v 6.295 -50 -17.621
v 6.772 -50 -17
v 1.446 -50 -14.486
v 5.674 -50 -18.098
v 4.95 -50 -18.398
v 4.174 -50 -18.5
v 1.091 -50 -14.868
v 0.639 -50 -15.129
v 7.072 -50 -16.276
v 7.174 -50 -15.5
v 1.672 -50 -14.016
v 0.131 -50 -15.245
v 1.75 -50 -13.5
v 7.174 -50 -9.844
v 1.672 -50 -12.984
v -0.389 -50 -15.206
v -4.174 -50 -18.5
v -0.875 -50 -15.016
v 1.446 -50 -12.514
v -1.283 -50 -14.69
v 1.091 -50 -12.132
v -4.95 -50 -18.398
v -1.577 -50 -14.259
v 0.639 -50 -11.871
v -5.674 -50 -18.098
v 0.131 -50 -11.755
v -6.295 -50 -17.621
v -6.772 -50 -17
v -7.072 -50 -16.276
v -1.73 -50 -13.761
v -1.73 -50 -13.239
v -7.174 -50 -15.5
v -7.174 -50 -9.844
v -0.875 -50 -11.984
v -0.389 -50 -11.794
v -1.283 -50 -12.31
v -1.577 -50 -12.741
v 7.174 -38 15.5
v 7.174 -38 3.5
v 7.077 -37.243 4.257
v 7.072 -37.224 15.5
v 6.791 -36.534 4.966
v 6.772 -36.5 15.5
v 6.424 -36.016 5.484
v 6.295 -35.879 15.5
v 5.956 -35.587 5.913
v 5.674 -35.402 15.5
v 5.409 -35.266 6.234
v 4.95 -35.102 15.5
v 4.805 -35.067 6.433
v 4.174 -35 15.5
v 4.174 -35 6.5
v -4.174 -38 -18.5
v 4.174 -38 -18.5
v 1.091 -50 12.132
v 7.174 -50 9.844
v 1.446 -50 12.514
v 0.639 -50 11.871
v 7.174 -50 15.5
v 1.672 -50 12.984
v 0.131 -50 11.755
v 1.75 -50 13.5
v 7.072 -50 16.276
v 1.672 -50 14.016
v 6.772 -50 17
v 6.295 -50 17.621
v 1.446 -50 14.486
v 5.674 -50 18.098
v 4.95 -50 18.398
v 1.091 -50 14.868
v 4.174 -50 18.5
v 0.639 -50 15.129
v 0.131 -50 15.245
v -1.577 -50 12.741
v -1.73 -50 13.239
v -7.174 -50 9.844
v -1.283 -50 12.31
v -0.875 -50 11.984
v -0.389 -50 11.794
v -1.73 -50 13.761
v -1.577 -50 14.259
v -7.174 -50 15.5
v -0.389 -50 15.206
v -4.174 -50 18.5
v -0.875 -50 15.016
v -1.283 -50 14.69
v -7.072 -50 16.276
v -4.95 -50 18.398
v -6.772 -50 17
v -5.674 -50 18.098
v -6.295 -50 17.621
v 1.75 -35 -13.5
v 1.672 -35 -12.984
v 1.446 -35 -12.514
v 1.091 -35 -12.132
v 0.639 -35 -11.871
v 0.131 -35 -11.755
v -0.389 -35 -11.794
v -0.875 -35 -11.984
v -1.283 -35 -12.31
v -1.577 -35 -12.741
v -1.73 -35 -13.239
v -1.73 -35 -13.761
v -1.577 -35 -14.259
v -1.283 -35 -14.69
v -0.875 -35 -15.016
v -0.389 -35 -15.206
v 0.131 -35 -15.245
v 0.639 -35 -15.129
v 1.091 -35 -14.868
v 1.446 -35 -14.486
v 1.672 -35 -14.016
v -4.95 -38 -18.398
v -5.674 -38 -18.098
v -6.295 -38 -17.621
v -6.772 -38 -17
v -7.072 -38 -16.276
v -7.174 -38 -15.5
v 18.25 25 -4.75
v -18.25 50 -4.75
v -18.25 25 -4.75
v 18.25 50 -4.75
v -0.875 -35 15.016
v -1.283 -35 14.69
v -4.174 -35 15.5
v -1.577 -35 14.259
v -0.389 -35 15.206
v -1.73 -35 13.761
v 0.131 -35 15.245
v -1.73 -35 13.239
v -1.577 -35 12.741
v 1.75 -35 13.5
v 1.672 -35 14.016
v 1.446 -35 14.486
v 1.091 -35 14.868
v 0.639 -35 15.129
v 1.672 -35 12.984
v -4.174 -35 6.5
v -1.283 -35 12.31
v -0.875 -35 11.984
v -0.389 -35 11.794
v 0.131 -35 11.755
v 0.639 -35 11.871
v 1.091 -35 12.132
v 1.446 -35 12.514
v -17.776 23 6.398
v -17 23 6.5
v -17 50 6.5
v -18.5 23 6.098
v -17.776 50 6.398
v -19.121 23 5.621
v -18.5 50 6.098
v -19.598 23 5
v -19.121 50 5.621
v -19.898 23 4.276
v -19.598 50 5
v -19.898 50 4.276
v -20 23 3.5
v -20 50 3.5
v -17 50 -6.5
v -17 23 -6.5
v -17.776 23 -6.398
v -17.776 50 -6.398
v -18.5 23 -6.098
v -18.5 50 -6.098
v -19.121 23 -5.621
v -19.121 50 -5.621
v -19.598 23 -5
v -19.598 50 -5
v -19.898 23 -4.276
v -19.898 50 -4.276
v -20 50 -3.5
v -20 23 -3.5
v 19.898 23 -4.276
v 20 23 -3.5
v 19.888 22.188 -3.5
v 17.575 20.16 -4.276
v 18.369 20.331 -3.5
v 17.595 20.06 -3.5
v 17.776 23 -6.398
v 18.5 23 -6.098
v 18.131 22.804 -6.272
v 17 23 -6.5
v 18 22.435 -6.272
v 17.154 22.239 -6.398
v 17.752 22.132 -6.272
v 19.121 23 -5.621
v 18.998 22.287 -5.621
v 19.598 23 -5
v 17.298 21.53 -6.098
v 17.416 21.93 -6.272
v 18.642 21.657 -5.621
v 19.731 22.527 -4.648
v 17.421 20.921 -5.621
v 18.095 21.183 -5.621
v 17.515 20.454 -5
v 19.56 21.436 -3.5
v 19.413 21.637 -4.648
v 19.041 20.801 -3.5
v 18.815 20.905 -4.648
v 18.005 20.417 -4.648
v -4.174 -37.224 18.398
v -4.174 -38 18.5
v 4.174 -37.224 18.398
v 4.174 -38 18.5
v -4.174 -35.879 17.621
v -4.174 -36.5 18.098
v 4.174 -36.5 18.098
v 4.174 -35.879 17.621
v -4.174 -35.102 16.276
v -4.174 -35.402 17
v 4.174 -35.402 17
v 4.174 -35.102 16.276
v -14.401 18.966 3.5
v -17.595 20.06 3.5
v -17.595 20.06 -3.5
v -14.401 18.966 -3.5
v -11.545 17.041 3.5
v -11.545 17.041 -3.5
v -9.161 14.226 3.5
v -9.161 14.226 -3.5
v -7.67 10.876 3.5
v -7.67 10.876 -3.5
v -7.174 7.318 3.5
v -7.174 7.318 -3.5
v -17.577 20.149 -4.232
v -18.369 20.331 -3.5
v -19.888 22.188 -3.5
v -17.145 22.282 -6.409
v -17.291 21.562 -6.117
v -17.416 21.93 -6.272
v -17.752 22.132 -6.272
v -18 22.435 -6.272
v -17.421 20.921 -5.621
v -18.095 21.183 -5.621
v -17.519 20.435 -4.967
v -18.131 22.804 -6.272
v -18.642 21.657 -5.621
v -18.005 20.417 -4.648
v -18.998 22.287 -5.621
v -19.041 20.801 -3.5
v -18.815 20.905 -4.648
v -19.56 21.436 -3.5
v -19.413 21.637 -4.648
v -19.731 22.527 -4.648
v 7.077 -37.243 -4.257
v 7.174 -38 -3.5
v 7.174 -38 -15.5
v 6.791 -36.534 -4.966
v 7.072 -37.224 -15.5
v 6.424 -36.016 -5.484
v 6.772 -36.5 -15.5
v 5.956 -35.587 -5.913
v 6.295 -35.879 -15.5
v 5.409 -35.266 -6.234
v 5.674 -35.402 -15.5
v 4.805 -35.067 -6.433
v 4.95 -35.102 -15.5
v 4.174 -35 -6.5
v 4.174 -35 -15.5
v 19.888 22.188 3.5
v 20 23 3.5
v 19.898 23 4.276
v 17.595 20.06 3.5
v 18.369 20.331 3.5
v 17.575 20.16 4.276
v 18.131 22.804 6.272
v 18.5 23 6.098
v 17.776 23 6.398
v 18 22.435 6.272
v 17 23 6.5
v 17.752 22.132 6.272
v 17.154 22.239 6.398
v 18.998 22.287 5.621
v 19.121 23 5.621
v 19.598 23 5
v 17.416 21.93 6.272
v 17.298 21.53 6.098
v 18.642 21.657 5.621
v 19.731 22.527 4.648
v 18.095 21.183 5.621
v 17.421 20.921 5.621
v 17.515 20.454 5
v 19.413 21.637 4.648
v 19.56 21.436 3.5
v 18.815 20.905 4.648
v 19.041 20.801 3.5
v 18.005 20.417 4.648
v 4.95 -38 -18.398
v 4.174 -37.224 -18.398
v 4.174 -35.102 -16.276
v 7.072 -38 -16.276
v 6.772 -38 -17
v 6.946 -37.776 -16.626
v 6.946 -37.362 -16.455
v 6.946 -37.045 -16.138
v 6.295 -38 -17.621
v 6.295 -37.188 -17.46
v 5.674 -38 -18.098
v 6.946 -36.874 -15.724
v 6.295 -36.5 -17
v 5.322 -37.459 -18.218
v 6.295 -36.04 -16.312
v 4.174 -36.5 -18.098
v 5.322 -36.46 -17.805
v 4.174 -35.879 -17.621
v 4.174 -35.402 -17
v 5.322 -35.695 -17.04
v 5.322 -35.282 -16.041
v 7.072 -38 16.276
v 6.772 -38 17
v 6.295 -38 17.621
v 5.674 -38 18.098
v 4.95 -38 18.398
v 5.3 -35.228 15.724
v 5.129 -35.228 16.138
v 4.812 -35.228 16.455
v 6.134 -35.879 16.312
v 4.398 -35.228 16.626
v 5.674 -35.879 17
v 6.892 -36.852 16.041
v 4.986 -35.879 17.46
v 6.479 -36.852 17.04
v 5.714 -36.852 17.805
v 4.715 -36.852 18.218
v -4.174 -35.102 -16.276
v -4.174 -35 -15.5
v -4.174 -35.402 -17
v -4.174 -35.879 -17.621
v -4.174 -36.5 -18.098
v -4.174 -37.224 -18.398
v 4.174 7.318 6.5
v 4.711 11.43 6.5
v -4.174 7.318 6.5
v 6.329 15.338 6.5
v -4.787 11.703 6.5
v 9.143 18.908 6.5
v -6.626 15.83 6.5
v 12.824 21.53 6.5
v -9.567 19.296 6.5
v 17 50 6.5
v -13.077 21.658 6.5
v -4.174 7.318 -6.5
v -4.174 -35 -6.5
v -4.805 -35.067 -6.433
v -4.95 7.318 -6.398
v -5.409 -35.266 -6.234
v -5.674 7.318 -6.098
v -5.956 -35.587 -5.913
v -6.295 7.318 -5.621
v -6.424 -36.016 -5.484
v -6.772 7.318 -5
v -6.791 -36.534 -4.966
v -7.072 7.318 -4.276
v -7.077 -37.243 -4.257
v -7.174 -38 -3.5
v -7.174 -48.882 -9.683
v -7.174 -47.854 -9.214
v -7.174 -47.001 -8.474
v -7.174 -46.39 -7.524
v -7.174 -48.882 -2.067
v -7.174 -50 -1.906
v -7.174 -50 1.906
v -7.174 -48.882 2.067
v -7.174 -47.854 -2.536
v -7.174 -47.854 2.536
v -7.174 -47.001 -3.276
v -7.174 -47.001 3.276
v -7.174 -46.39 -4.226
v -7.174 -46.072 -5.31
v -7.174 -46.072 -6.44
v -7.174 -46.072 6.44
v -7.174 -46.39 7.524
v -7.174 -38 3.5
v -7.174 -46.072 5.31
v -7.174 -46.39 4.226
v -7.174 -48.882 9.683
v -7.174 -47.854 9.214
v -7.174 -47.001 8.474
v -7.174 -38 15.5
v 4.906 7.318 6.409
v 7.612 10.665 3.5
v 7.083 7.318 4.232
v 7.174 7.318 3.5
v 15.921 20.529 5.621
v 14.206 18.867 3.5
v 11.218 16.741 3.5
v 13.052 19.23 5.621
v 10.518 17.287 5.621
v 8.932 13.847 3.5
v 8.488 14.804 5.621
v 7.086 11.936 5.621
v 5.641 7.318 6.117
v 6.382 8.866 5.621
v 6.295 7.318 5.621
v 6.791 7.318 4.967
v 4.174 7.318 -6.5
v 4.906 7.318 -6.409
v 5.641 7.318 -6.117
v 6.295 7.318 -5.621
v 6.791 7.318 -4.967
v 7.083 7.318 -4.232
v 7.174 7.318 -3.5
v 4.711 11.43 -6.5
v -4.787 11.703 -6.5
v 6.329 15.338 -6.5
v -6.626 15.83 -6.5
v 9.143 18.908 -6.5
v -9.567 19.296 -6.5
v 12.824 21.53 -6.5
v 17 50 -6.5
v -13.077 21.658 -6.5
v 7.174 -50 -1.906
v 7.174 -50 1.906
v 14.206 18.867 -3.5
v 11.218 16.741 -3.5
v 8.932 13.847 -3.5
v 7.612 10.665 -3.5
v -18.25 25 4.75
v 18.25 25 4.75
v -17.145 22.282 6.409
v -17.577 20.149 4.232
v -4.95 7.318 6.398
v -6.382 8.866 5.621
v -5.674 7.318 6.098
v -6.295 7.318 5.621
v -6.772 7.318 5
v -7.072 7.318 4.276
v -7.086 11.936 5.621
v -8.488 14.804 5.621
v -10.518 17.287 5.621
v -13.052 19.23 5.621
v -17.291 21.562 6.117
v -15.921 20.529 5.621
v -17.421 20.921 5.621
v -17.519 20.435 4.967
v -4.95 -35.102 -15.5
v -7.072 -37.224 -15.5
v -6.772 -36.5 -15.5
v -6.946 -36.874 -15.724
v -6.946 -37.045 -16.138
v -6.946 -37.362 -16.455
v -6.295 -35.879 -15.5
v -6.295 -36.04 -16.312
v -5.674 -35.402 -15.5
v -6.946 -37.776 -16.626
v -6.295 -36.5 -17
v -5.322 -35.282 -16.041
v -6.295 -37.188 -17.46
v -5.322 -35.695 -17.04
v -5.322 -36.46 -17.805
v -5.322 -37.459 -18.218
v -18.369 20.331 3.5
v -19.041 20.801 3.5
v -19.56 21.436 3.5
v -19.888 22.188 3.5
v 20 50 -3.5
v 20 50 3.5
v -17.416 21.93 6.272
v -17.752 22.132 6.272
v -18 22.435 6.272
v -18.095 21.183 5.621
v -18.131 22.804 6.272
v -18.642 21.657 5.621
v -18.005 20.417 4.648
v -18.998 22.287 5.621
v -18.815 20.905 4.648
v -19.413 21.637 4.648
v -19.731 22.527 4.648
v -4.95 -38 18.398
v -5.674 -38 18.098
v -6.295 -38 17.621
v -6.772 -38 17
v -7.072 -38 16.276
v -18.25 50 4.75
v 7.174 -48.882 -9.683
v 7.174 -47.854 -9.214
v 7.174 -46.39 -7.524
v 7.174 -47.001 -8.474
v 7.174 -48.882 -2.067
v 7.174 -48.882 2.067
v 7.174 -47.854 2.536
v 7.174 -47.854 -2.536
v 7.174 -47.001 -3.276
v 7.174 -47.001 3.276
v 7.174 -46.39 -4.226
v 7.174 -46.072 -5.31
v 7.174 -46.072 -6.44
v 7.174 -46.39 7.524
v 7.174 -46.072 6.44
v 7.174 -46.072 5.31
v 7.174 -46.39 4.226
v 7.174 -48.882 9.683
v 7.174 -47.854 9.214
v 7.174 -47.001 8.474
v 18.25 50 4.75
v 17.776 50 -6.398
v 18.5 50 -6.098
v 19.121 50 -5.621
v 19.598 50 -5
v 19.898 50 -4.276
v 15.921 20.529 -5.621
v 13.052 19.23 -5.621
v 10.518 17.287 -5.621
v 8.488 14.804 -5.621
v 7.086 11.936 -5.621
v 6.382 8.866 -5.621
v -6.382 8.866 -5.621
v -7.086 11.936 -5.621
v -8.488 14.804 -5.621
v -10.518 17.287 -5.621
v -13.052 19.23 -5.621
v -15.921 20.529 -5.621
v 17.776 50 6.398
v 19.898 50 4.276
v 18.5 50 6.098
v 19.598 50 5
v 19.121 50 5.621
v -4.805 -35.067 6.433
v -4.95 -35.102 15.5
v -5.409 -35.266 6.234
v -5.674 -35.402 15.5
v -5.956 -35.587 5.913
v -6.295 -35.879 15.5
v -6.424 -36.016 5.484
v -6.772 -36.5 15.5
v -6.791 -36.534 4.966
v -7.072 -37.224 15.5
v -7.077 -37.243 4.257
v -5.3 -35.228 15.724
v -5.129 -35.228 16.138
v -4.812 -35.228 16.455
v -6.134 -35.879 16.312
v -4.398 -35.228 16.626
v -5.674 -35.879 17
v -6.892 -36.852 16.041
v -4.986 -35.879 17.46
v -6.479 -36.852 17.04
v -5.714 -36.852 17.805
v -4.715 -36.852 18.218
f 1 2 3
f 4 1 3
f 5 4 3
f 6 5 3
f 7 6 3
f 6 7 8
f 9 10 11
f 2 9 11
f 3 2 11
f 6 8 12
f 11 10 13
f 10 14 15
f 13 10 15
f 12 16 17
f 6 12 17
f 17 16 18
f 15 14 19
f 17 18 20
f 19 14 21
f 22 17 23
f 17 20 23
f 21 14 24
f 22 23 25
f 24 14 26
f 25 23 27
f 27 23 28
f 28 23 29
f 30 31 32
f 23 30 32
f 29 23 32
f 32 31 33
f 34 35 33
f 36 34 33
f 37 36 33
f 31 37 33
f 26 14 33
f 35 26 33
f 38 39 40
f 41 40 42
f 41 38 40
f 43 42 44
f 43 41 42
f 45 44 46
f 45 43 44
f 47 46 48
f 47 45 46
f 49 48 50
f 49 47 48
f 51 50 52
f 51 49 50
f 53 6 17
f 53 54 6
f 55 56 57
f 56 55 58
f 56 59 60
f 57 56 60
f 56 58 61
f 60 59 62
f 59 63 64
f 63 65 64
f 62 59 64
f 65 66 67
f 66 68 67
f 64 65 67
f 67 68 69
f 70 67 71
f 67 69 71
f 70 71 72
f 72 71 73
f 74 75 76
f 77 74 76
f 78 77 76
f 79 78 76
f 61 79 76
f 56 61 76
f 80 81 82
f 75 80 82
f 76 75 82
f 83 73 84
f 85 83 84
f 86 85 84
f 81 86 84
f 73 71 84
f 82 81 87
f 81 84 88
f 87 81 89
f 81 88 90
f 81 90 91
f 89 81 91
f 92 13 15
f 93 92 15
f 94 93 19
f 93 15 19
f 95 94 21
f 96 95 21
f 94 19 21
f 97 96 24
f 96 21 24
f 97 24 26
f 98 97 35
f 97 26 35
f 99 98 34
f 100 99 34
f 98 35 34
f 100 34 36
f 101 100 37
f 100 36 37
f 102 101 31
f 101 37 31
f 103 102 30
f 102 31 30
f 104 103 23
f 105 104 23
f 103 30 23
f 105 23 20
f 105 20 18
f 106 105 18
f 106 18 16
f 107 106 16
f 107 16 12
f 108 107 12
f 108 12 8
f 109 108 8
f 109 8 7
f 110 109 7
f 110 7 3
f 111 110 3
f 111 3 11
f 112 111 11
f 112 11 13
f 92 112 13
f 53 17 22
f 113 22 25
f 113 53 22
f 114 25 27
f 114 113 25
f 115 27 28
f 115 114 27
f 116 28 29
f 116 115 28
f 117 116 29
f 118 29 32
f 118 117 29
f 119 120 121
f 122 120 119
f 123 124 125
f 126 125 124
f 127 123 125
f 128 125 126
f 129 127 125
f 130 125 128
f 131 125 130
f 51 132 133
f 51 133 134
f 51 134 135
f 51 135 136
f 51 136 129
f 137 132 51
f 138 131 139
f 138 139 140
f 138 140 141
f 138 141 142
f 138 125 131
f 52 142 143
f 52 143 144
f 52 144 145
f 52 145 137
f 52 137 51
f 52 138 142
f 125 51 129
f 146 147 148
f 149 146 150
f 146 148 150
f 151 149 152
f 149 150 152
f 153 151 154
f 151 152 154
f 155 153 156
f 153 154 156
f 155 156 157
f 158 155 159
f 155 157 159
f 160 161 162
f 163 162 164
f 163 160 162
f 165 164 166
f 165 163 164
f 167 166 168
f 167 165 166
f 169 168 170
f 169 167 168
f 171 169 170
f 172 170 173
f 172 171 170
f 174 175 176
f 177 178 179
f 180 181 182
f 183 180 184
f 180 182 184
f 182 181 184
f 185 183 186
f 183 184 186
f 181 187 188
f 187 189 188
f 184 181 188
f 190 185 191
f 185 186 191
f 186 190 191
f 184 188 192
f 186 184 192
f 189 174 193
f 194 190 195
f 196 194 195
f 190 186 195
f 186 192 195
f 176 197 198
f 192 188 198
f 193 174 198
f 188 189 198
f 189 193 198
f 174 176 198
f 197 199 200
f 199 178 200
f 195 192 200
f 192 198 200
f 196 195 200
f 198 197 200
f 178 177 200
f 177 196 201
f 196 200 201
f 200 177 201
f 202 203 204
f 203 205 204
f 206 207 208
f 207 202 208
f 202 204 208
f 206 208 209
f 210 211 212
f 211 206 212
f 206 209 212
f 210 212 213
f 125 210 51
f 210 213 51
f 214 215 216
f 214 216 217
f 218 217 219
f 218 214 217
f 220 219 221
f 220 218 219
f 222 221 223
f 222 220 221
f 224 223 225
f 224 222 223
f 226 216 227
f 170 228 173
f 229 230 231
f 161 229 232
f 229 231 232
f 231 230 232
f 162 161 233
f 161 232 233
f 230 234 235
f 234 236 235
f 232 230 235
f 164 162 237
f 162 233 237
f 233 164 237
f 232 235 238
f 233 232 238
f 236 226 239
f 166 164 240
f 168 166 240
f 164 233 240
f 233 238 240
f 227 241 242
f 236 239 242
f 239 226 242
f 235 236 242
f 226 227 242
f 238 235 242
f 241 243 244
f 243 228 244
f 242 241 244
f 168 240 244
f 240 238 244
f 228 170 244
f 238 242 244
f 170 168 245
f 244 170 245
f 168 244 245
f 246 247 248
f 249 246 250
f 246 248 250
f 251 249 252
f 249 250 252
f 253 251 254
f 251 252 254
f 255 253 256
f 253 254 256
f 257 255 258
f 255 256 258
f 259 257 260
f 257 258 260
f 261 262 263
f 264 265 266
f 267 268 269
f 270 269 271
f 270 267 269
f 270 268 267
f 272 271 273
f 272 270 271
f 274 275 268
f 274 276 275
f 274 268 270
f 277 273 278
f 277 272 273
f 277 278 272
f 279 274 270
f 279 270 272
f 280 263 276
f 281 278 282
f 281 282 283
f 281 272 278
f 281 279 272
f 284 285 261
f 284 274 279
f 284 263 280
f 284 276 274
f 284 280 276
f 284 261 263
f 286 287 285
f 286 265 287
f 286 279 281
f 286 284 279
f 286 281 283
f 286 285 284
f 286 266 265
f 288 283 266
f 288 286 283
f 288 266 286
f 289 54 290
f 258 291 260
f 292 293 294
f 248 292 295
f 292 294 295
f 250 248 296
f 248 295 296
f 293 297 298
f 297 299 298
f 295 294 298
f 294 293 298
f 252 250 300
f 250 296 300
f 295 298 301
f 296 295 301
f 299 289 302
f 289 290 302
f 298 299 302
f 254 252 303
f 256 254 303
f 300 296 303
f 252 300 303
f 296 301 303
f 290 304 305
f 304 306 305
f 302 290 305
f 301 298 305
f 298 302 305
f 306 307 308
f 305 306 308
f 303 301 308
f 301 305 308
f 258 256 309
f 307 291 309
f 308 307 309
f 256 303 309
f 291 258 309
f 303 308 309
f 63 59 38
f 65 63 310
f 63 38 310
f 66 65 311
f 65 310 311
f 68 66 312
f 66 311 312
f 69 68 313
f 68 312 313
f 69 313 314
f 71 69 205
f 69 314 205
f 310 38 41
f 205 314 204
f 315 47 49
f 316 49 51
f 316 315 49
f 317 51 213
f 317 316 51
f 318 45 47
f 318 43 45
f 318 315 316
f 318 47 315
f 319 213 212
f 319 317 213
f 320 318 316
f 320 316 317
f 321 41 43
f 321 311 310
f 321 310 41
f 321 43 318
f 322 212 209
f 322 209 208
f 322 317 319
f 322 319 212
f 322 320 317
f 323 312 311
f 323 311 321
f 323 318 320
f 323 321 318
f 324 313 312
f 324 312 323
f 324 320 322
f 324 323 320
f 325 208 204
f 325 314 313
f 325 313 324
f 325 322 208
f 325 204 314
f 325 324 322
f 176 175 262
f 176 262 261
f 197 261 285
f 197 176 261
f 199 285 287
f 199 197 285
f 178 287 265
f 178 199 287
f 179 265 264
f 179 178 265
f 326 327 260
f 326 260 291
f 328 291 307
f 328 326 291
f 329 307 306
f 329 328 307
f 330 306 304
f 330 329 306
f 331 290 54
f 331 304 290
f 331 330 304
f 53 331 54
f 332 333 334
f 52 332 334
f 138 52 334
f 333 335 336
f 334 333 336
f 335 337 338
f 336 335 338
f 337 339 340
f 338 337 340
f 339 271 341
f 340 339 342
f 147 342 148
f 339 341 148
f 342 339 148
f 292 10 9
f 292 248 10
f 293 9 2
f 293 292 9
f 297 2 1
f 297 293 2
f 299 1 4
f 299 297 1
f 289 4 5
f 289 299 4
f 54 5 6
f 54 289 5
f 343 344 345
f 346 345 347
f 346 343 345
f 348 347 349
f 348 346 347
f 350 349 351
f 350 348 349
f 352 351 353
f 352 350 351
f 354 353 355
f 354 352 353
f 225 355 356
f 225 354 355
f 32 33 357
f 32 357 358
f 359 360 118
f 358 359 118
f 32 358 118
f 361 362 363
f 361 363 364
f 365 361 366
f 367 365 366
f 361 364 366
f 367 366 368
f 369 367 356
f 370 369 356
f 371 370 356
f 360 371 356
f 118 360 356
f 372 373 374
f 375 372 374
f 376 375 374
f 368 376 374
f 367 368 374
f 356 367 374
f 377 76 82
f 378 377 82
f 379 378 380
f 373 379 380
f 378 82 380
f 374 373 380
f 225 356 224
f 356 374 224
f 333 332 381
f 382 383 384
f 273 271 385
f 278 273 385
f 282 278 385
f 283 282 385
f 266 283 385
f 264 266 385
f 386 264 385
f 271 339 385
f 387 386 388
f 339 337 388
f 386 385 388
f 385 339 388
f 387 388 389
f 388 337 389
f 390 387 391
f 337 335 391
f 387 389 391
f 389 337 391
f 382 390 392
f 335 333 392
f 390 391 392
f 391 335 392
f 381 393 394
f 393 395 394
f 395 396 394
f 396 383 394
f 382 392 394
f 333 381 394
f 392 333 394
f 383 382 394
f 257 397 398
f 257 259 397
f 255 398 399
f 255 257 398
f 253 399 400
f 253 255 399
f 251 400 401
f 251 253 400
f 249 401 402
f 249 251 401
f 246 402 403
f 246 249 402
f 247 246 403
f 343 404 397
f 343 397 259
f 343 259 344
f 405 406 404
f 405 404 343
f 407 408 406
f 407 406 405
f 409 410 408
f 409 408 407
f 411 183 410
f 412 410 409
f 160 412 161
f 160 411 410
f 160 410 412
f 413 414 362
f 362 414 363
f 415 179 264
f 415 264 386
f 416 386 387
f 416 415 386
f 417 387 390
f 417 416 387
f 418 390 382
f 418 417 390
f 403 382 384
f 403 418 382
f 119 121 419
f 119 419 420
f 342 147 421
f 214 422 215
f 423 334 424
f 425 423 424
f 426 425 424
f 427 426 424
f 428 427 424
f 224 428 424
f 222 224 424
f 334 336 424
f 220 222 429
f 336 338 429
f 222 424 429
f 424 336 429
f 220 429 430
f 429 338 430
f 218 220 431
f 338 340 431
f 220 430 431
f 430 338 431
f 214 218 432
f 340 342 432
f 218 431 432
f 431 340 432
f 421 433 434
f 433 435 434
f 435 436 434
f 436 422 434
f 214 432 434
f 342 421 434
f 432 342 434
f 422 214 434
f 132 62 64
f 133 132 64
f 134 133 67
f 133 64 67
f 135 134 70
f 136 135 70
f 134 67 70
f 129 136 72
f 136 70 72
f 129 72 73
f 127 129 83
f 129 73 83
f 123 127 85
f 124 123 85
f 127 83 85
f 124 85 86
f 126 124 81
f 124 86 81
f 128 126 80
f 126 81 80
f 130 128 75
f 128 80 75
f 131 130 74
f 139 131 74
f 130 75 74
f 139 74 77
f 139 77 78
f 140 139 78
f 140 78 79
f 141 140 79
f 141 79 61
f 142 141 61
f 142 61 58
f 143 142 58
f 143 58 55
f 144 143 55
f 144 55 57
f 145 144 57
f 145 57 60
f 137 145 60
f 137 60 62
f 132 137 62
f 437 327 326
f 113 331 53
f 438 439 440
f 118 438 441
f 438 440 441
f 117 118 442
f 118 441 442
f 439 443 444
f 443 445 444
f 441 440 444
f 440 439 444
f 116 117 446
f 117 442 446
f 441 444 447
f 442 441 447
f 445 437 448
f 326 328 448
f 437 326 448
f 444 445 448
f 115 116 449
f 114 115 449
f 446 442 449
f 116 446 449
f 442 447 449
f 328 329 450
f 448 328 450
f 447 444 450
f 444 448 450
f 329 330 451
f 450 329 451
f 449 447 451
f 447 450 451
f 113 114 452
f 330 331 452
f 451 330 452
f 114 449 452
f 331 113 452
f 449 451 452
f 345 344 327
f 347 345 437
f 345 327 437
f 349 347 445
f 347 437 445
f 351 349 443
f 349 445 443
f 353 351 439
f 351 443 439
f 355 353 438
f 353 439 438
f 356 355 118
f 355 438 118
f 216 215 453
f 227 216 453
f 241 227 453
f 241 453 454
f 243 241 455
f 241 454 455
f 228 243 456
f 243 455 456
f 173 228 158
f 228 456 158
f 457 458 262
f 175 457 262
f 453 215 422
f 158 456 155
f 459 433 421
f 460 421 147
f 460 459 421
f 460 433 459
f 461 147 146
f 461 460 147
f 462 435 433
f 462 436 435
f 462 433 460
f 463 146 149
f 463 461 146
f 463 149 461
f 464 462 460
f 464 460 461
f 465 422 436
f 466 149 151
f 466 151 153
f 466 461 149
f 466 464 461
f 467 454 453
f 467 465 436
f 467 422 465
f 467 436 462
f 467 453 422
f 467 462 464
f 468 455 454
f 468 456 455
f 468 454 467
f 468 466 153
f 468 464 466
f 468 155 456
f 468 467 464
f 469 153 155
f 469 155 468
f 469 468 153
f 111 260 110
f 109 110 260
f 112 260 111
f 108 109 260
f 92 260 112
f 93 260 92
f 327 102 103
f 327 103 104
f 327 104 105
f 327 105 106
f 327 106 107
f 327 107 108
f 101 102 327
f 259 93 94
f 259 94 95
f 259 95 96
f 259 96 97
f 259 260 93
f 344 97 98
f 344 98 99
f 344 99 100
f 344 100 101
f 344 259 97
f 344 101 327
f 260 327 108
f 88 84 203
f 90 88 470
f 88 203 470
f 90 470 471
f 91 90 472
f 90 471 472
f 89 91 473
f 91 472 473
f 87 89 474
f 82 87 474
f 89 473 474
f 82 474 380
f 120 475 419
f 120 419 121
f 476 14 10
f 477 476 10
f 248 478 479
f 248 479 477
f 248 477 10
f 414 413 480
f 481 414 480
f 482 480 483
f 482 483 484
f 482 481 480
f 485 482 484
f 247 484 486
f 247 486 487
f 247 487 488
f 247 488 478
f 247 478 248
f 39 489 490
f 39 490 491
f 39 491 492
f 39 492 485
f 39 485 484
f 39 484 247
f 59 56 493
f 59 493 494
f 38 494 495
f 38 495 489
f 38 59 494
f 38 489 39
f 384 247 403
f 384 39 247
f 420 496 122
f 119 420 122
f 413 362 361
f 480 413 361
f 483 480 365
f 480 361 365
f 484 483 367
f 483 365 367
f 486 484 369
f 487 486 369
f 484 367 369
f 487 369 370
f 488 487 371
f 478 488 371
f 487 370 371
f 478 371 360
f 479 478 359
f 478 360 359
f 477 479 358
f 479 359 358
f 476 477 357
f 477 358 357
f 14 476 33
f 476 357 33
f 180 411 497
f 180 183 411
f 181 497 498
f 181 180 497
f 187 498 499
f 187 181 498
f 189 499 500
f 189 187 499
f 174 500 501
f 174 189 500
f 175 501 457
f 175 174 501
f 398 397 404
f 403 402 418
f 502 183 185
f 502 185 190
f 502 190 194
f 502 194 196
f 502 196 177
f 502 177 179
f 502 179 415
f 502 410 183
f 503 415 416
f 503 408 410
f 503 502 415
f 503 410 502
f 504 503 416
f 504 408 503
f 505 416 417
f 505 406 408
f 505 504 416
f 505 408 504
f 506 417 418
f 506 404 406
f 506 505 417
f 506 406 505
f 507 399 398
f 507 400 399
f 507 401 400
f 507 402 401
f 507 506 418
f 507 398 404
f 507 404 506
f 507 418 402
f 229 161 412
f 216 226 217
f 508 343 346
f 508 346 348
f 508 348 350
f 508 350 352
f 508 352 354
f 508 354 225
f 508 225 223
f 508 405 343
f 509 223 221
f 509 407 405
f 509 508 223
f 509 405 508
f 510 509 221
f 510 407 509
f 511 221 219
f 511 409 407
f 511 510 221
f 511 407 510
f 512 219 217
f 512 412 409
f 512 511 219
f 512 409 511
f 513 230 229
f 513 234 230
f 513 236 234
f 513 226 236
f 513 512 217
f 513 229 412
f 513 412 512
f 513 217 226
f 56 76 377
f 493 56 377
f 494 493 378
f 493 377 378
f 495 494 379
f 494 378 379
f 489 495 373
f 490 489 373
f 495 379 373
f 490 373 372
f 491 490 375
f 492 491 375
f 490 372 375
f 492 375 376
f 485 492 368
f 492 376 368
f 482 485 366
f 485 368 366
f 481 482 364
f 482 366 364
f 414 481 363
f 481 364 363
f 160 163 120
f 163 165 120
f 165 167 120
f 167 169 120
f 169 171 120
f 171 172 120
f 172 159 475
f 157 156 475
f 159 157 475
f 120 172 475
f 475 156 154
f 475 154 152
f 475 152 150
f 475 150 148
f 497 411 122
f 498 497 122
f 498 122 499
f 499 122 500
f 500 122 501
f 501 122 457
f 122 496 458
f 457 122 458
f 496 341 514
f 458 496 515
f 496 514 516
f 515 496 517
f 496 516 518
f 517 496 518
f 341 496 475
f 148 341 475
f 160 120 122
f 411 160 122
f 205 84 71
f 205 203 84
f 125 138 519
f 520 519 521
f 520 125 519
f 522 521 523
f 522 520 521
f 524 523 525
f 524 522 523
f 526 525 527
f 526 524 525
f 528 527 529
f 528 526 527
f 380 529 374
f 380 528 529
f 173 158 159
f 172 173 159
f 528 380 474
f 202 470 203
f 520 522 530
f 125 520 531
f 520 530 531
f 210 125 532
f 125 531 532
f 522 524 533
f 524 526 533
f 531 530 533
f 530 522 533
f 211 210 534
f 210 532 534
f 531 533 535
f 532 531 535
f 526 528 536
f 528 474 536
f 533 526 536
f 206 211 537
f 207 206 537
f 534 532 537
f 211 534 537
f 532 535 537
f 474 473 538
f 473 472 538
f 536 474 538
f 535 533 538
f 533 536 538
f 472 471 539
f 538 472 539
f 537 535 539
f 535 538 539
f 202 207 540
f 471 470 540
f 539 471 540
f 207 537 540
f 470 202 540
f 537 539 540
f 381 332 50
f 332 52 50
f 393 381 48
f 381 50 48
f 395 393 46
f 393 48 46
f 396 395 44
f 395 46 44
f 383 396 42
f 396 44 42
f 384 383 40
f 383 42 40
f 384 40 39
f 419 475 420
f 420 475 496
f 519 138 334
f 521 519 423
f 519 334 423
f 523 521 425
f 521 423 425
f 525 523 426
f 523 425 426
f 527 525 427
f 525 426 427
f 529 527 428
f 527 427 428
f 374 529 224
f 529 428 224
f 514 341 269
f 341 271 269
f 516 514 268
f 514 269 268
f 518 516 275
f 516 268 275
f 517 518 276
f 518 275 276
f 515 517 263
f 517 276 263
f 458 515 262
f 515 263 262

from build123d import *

# Parameters (mm, degrees)
RESSALTO_EXTRUS_O1_DEPTH = 6.5
FILETE1_R                = 3
FILETE2_R                = 3
FILETE3_R                = 13
ESBO_O4_W                = 36.5
ESBO_O4_H                = 9.5
CORTE_EXTRUS_O1_DEPTH    = 25
ESBO_O11_W               = 14.347963754
ESBO_O11_H               = 15
RESSALTO_EXTRUS_O5_DEPTH = 12
ESBO_O17_W               = 14.347963754
ESBO_O17_H               = 15
RESSALTO_EXTRUS_O6_DEPTH = 12
ESBO_O18_R               = 1.75
CORTE_EXTRUS_O5_DEPTH    = 25
ESBO_O19_R               = 3.96875
CORTE_EXTRUS_O6_DEPTH    = 25
FILETE14_R               = 3


with BuildPart() as part:
    # Esboço2 → Ressalto-extrusão1 (new body, symmetric)
    with BuildSketch(Plane.XY):
        Polygon((-20, 50), (20, 50), (20, 20), (7.173981877, 20), (7.173981877, -50), (-7.173981877, -50), (-7.173981877, 20), (-20, 20), align=None)
    extrude(amount=RESSALTO_EXTRUS_O1_DEPTH, both=True)

    # Filete1
    filete1_edges = [part.edges().sort_by_distance(p)[0] for p in [
        (-20, 20, 0),
    ]]
    fillet(filete1_edges, radius=FILETE1_R)

    # Filete2
    filete2_edges = [part.edges().sort_by_distance(p)[0] for p in [
        (20, 20, 0),
    ]]
    fillet(filete2_edges, radius=FILETE2_R)

    # Filete3
    filete3_edges = [part.edges().sort_by_distance(p)[0] for p in [
        (-7.173981877, 20, 0),
        (7.173981877, 20, 0),
    ]]
    fillet(filete3_edges, radius=FILETE3_R)

    # Esboço4 → Corte-extrusão1 (cut)
    with BuildSketch(Plane(origin=(0, 50, 0), x_dir=(1, 0, 0), z_dir=(0, 1, 0))):
        Rectangle(ESBO_O4_W, ESBO_O4_H)
    extrude(amount=-CORTE_EXTRUS_O1_DEPTH, mode=Mode.SUBTRACT)

    # Esboço11 → Ressalto-extrusão5 (add)
    with BuildSketch(Plane.XY.offset(6.5)):
        with Locations((0, -42.5)):
            Rectangle(ESBO_O11_W, ESBO_O11_H)
    extrude(amount=RESSALTO_EXTRUS_O5_DEPTH)

    # Esboço17 → Ressalto-extrusão6 (add)
    with BuildSketch(Plane(origin=(0, 0, -6.5), x_dir=(-1, 0, 0), z_dir=(0, 0, -1))):
        with Locations((0, -42.5)):
            Rectangle(ESBO_O17_W, ESBO_O17_H)
    extrude(amount=RESSALTO_EXTRUS_O6_DEPTH)

    # Esboço18 → Corte-extrusão5 (cut)
    with BuildSketch(Plane.XZ.offset(50)):
        with Locations((0, 13.5)):
            Circle(ESBO_O18_R)
        with Locations((0, -13.5)):
            Circle(ESBO_O18_R)
    extrude(amount=-CORTE_EXTRUS_O5_DEPTH, mode=Mode.SUBTRACT)

    # Esboço19 → Corte-extrusão6 (cut)
    with BuildSketch(Plane.ZY.offset(7.173981877)):
        with Locations((-5.875, -50)):
            Circle(ESBO_O19_R)
        with Locations((5.875, -50)):
            Circle(ESBO_O19_R)
    extrude(amount=-CORTE_EXTRUS_O6_DEPTH, mode=Mode.SUBTRACT)

    # Filete14
    filete14_edges = [part.edges().sort_by_distance(p)[0] for p in [
        (20, 36.5, 6.5),
        (19.322214978, 21.100706027, 6.5),
        (10.111050307, 15.548251086, 6.5),
        (-20, 36.5, 6.5),
        (-19.322214978, 21.100706027, 6.5),
        (-10.111050307, 15.548251086, 6.5),
        (20, 36.5, -6.5),
        (19.322214978, 21.100706027, -6.5),
        (10.111050307, 15.548251086, -6.5),
        (-20, 36.5, -6.5),
        (-19.322214978, 21.100706027, -6.5),
        (-10.111050307, 15.548251086, -6.5),
        (-7.173981877, -42.5, 18.5),
        (-7.173981877, -35, 12.5),
        (0, -35, -18.5),
        (-7.173981877, -35, -12.5),
        (-7.173981877, -42.5, -18.5),
        (7.173981877, -42.5, -18.5),
        (7.173981877, -35, -12.5),
        (7.173981877, -42.5, 18.5),
        (7.173981877, -35, 12.5),
        (0, -35, 18.5),
        (7.173981877, -13.841011399, 6.5),
        (-7.173981877, -13.841011399, 6.5),
        (7.173981877, -13.841011399, -6.5),
        (-7.173981877, -13.841011399, -6.5),
    ]]
    fillet(filete14_edges, radius=FILETE14_R)


solid = part.part
